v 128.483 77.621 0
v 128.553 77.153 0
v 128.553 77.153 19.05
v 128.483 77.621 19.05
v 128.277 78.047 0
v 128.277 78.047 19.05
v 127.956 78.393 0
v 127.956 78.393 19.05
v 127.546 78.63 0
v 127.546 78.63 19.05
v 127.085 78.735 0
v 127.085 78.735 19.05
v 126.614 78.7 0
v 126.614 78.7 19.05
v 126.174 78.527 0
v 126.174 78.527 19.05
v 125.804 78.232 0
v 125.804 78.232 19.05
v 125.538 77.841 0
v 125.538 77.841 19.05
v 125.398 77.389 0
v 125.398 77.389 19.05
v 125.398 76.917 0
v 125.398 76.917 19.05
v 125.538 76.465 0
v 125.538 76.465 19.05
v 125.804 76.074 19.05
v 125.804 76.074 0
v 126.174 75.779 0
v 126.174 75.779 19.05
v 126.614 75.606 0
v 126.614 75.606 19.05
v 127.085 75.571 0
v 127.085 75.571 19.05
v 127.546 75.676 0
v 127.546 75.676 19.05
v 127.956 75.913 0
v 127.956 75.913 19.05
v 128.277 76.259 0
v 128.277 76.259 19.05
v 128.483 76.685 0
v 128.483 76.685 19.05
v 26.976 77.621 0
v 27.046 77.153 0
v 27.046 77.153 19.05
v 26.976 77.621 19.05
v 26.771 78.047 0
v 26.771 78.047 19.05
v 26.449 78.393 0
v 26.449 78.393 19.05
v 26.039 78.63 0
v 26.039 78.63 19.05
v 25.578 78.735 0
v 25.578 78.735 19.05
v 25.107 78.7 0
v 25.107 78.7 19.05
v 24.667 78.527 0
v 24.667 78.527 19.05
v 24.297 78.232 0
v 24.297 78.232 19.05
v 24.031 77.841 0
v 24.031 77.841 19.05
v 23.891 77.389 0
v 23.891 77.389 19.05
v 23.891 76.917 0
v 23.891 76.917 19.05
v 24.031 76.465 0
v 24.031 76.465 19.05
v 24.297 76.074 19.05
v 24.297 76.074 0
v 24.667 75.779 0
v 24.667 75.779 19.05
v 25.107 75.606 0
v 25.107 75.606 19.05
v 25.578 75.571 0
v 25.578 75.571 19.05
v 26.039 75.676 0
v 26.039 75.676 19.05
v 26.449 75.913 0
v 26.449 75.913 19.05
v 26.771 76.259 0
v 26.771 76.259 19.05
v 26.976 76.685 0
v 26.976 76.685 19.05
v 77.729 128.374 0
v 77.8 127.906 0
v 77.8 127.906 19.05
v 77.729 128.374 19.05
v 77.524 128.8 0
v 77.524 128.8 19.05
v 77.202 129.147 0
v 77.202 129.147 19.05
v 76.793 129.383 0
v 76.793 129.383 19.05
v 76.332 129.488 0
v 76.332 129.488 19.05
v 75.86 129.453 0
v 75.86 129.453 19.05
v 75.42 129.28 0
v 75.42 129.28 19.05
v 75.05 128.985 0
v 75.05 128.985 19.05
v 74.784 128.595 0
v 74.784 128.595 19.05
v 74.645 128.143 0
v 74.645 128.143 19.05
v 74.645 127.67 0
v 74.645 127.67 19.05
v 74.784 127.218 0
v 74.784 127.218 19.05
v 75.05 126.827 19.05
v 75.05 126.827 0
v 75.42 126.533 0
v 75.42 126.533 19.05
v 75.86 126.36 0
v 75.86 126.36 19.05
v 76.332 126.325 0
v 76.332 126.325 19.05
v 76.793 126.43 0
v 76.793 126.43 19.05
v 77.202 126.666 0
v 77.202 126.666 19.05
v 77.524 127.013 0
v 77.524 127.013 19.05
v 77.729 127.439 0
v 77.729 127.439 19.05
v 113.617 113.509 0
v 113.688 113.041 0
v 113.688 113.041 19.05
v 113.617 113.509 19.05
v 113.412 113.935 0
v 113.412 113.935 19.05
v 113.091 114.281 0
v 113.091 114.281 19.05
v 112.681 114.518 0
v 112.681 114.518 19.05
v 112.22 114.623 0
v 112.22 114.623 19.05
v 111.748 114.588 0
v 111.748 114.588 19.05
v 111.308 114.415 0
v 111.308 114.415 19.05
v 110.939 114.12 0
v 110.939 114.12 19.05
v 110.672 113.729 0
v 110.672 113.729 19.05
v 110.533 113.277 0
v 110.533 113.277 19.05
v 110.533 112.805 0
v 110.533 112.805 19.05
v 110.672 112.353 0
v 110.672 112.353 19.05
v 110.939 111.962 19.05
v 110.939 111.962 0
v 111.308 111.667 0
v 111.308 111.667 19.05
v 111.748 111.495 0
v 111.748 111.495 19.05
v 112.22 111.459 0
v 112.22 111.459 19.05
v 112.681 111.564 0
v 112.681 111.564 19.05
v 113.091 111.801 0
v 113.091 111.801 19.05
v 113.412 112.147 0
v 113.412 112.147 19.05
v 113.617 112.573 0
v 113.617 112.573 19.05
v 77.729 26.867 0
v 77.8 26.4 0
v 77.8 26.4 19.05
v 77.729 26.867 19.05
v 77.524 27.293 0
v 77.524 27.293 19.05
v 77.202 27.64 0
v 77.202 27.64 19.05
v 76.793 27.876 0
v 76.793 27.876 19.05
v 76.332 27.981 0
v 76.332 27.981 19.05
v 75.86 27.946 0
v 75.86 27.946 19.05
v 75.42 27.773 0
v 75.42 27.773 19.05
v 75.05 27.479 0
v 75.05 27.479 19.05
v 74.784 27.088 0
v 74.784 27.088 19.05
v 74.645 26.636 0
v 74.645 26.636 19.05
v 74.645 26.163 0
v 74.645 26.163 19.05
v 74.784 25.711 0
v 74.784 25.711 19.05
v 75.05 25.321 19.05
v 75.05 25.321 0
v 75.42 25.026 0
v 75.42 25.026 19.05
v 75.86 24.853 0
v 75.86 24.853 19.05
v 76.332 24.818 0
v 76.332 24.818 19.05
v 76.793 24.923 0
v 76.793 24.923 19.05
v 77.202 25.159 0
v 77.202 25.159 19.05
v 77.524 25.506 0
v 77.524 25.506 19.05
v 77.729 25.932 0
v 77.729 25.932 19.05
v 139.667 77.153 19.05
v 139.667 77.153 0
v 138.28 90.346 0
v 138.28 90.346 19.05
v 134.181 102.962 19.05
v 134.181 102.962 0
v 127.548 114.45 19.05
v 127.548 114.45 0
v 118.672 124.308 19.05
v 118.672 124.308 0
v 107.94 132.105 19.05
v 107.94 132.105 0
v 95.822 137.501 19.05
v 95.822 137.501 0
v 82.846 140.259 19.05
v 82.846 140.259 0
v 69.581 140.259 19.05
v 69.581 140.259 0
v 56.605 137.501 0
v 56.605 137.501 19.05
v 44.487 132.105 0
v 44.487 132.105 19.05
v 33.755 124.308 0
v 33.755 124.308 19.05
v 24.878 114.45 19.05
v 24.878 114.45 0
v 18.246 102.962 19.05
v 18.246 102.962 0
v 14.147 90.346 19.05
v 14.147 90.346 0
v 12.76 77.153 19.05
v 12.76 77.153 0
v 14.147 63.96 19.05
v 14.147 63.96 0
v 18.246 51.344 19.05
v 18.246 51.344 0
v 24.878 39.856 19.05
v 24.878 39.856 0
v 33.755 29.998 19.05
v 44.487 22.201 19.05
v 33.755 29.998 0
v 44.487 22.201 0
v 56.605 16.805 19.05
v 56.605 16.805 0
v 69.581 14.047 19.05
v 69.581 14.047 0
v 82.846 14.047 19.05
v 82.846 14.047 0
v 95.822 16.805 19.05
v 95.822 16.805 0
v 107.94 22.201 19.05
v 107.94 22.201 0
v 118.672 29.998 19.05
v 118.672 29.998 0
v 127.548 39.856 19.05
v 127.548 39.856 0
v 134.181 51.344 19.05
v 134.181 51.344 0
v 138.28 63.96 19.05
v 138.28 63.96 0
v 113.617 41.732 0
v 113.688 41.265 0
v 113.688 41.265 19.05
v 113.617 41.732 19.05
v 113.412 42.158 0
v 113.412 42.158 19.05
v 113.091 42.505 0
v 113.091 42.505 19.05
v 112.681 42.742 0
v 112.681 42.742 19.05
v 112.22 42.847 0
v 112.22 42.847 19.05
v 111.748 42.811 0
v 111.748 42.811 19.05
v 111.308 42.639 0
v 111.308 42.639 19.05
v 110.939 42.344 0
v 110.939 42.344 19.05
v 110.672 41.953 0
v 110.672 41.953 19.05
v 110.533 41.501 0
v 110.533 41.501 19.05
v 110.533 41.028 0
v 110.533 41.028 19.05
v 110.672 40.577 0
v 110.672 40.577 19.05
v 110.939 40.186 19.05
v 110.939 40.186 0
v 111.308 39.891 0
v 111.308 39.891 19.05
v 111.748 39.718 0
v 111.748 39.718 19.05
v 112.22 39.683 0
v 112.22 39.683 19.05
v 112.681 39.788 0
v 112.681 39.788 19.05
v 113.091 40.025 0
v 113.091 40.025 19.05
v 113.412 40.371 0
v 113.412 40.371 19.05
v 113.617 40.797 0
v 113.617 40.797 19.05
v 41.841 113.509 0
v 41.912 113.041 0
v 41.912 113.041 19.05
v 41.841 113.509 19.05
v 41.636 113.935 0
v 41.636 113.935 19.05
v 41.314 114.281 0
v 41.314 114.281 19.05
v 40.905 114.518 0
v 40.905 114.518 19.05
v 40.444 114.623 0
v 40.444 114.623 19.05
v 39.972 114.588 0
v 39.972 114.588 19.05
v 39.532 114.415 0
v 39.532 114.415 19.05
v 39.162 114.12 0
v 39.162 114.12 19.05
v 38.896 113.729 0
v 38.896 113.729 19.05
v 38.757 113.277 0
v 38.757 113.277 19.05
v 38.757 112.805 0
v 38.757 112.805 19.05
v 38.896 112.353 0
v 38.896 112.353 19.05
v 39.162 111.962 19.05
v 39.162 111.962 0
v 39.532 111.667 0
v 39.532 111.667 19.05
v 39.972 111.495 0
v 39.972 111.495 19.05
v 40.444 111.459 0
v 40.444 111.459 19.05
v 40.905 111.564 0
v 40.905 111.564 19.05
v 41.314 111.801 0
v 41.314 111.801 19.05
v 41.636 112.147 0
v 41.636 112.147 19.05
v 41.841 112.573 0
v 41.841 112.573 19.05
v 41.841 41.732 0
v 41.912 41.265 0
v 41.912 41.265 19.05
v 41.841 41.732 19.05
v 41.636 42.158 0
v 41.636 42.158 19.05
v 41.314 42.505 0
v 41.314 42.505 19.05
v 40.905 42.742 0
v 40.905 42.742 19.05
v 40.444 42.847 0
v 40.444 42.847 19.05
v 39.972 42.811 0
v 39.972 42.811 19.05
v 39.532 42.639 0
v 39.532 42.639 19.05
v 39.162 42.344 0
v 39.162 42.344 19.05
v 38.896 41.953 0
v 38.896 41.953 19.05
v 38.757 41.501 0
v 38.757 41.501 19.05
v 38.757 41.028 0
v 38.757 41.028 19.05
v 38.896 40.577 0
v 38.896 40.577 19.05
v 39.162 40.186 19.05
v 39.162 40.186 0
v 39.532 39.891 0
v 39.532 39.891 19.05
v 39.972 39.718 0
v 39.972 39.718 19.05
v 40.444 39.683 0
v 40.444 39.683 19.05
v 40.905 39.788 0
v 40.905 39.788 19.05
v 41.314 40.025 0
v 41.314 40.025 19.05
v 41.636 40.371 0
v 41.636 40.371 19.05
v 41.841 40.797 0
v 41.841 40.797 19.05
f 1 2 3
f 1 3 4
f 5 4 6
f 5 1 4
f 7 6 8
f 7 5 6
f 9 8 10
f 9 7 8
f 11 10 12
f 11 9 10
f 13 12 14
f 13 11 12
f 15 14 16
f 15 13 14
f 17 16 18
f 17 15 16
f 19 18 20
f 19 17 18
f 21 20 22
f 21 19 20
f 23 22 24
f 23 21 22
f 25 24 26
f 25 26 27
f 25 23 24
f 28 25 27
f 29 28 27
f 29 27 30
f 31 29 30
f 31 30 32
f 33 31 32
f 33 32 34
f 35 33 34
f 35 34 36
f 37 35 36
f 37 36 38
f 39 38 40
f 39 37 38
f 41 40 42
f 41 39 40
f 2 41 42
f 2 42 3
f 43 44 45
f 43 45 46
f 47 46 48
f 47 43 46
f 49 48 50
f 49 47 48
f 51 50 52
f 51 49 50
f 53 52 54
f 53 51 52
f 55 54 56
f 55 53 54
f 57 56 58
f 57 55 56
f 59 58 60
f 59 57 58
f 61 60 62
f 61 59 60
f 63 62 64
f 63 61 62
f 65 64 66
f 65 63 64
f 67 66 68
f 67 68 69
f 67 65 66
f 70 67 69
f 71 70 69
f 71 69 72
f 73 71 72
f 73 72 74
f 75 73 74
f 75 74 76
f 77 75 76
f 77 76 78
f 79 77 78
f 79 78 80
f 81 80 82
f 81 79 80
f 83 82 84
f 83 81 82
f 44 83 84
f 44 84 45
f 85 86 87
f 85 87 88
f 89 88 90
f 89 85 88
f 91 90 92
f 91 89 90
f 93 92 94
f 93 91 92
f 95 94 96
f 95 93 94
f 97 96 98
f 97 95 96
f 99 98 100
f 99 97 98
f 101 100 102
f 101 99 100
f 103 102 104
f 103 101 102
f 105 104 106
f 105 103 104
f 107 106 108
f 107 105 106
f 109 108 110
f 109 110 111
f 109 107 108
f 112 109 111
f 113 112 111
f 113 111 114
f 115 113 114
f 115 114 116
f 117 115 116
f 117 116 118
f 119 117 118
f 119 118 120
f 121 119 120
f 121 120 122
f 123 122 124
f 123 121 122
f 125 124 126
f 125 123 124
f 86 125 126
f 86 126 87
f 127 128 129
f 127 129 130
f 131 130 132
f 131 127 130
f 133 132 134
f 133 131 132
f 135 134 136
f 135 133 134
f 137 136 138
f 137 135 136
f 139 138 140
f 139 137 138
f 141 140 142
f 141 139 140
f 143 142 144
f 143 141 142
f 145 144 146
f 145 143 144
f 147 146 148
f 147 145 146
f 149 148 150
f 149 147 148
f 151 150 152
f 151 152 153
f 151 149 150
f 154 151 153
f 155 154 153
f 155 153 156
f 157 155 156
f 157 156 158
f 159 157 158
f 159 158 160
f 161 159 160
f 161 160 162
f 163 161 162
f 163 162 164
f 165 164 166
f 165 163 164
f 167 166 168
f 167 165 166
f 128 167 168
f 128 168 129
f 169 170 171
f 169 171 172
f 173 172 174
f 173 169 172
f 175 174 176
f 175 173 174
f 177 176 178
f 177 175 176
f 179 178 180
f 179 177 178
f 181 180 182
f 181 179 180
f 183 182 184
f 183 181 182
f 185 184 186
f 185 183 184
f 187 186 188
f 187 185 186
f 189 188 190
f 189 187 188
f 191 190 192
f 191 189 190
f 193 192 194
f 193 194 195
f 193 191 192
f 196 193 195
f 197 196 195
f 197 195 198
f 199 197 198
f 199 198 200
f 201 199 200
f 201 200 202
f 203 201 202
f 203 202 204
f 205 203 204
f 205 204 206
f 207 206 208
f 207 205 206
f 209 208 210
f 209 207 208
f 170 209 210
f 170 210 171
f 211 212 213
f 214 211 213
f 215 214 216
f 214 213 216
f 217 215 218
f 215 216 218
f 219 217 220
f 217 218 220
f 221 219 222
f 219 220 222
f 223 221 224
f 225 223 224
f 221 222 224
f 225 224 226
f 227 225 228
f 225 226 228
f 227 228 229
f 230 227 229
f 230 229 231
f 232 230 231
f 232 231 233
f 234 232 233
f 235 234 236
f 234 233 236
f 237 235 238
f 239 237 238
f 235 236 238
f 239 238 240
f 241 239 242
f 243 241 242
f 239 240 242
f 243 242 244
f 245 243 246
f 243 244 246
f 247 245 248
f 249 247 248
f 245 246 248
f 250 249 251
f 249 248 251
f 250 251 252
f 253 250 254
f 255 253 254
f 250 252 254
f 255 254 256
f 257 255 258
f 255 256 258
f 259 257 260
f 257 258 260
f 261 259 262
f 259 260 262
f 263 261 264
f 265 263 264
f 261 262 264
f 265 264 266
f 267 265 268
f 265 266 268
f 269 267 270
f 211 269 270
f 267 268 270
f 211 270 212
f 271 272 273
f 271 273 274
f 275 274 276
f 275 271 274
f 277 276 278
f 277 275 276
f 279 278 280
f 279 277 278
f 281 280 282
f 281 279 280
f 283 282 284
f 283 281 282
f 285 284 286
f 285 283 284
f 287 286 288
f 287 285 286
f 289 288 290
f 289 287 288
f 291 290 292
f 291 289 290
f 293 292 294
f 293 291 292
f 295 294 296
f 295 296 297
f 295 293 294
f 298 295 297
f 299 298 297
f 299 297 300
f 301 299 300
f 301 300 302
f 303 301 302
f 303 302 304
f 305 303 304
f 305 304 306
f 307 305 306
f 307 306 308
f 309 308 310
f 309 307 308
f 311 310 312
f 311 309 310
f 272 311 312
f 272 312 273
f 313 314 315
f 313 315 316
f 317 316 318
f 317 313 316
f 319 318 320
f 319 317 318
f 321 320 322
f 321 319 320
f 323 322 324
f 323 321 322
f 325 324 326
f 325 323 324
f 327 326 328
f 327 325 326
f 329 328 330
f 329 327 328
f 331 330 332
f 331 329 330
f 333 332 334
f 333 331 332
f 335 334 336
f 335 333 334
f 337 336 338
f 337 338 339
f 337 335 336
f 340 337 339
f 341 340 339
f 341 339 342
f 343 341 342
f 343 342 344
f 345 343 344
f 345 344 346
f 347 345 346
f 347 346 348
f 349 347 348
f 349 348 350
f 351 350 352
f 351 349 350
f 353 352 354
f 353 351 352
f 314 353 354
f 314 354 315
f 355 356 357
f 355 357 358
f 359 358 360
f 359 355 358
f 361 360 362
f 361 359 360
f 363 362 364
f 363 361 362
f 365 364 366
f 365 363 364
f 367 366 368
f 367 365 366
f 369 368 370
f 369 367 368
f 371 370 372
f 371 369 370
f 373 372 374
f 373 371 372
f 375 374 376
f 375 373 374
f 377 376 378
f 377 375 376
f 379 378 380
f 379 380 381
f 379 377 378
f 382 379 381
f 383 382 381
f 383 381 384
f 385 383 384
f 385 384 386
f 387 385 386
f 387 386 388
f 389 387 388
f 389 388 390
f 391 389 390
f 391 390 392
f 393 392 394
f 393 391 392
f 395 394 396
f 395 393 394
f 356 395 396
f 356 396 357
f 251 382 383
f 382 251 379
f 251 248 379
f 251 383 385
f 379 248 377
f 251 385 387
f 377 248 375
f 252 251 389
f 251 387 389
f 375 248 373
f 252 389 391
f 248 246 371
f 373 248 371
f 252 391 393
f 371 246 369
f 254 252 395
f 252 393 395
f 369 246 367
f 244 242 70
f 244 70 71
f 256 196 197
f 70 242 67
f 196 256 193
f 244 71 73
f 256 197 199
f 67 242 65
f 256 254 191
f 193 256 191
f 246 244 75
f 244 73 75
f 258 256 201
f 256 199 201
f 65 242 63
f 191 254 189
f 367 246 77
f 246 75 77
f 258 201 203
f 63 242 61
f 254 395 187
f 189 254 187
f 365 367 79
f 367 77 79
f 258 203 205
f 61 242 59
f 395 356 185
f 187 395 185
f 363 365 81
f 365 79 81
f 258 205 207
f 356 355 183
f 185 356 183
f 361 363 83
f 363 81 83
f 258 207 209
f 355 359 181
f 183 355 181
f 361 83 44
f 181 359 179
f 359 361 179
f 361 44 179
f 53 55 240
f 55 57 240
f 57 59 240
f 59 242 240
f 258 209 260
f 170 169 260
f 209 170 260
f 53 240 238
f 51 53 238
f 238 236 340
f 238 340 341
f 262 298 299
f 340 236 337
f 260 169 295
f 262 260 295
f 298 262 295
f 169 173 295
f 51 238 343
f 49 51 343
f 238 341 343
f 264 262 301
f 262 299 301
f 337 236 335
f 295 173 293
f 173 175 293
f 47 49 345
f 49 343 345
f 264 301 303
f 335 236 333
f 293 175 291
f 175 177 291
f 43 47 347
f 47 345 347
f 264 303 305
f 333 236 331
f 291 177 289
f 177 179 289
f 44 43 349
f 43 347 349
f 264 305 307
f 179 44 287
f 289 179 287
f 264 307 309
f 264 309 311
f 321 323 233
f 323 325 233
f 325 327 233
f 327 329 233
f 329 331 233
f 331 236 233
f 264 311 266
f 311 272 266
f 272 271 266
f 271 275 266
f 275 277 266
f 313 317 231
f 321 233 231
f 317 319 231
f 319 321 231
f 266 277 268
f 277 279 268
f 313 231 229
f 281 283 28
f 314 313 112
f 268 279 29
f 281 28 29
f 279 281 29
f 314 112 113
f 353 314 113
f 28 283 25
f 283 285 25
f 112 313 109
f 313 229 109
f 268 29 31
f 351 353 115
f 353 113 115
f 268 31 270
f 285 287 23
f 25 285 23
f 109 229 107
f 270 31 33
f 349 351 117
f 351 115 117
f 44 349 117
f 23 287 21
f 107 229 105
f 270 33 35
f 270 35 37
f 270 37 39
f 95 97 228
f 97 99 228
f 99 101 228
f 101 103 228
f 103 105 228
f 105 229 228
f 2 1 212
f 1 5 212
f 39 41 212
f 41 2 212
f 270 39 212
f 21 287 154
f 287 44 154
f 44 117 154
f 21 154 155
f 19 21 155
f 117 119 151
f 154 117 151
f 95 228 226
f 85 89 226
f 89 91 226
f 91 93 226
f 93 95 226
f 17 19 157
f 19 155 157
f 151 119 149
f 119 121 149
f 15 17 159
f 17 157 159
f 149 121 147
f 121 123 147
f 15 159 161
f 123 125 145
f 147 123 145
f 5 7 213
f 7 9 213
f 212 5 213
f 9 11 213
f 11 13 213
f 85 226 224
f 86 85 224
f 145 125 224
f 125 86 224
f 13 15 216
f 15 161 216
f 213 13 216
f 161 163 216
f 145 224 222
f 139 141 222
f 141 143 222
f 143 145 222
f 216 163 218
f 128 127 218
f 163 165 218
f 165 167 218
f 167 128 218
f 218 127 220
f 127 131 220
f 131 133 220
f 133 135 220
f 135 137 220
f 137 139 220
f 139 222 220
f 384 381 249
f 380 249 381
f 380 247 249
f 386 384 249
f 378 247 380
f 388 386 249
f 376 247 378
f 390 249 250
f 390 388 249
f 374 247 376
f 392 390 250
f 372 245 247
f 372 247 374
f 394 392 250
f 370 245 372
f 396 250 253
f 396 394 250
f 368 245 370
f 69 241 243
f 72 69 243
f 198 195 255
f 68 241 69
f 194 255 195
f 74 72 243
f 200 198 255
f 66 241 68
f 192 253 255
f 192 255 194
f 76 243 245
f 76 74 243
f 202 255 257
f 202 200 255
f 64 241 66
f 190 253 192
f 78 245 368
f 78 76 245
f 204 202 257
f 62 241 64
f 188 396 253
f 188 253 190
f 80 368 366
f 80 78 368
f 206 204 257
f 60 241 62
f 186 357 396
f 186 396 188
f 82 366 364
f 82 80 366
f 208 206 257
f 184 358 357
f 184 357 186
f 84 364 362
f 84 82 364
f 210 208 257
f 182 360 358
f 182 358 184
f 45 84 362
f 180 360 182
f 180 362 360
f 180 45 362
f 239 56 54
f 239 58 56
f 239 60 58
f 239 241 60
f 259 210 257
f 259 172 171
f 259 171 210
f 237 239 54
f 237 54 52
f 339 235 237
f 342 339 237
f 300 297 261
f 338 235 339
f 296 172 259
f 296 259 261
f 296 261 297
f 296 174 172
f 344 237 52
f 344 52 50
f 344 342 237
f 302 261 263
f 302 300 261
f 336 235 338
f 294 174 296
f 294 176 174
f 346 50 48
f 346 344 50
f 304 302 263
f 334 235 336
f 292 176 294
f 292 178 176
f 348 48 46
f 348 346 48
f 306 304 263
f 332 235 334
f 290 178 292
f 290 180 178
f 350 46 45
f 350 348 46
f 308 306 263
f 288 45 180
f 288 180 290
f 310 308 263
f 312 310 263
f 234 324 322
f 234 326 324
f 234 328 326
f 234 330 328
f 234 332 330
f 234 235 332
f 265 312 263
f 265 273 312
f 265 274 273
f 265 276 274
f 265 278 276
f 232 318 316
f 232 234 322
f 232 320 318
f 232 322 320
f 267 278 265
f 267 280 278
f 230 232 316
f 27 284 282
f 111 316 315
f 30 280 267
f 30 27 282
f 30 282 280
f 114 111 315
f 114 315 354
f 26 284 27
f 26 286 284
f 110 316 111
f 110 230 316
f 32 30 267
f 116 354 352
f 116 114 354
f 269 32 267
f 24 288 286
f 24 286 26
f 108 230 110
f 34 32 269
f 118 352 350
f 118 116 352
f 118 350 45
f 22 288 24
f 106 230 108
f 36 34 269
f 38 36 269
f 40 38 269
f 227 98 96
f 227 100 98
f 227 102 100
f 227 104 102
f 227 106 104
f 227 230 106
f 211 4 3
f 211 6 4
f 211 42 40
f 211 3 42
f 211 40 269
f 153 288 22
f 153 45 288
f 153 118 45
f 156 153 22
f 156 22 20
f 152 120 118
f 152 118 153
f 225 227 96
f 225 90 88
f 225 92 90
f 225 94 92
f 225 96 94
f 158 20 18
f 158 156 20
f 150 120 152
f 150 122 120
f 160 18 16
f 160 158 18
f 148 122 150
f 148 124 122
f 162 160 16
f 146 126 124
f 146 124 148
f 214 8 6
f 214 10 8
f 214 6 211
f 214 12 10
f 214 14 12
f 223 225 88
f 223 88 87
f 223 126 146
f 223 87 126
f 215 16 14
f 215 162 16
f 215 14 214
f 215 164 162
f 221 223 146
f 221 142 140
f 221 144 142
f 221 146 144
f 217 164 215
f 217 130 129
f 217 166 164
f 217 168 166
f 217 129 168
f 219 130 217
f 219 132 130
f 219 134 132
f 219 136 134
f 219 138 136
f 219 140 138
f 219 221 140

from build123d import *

# Parameters (mm, degrees)
F0_R     = 63.453437
F0_R_2   = 1.586336
F1_DEPTH = 19.05


with BuildPart() as f1:
    # F0 (on Top) → F1 (new body)
    with BuildSketch(Plane.XY):
        with Locations((76.21336, 77.152969)):
            Circle(F0_R)
        with Locations((40.325263, 41.264868)):
            Circle(F0_R_2, mode=Mode.SUBTRACT)
        with Locations((76.21336, 26.399533)):
            Circle(F0_R_2, mode=Mode.SUBTRACT)
        with Locations((25.459923, 77.152967)):
            Circle(F0_R_2, mode=Mode.SUBTRACT)
        with Locations((112.101459, 41.26487)):
            Circle(F0_R_2, mode=Mode.SUBTRACT)
        with Locations((126.966796, 77.152967)):
            Circle(F0_R_2, mode=Mode.SUBTRACT)
        with Locations((40.325261, 113.041068)):
            Circle(F0_R_2, mode=Mode.SUBTRACT)
        with Locations((76.21336, 127.906406)):
            Circle(F0_R_2, mode=Mode.SUBTRACT)
        with Locations((112.101461, 113.041067)):
            Circle(F0_R_2, mode=Mode.SUBTRACT)
    extrude(amount=F1_DEPTH)


solid = f1.part
